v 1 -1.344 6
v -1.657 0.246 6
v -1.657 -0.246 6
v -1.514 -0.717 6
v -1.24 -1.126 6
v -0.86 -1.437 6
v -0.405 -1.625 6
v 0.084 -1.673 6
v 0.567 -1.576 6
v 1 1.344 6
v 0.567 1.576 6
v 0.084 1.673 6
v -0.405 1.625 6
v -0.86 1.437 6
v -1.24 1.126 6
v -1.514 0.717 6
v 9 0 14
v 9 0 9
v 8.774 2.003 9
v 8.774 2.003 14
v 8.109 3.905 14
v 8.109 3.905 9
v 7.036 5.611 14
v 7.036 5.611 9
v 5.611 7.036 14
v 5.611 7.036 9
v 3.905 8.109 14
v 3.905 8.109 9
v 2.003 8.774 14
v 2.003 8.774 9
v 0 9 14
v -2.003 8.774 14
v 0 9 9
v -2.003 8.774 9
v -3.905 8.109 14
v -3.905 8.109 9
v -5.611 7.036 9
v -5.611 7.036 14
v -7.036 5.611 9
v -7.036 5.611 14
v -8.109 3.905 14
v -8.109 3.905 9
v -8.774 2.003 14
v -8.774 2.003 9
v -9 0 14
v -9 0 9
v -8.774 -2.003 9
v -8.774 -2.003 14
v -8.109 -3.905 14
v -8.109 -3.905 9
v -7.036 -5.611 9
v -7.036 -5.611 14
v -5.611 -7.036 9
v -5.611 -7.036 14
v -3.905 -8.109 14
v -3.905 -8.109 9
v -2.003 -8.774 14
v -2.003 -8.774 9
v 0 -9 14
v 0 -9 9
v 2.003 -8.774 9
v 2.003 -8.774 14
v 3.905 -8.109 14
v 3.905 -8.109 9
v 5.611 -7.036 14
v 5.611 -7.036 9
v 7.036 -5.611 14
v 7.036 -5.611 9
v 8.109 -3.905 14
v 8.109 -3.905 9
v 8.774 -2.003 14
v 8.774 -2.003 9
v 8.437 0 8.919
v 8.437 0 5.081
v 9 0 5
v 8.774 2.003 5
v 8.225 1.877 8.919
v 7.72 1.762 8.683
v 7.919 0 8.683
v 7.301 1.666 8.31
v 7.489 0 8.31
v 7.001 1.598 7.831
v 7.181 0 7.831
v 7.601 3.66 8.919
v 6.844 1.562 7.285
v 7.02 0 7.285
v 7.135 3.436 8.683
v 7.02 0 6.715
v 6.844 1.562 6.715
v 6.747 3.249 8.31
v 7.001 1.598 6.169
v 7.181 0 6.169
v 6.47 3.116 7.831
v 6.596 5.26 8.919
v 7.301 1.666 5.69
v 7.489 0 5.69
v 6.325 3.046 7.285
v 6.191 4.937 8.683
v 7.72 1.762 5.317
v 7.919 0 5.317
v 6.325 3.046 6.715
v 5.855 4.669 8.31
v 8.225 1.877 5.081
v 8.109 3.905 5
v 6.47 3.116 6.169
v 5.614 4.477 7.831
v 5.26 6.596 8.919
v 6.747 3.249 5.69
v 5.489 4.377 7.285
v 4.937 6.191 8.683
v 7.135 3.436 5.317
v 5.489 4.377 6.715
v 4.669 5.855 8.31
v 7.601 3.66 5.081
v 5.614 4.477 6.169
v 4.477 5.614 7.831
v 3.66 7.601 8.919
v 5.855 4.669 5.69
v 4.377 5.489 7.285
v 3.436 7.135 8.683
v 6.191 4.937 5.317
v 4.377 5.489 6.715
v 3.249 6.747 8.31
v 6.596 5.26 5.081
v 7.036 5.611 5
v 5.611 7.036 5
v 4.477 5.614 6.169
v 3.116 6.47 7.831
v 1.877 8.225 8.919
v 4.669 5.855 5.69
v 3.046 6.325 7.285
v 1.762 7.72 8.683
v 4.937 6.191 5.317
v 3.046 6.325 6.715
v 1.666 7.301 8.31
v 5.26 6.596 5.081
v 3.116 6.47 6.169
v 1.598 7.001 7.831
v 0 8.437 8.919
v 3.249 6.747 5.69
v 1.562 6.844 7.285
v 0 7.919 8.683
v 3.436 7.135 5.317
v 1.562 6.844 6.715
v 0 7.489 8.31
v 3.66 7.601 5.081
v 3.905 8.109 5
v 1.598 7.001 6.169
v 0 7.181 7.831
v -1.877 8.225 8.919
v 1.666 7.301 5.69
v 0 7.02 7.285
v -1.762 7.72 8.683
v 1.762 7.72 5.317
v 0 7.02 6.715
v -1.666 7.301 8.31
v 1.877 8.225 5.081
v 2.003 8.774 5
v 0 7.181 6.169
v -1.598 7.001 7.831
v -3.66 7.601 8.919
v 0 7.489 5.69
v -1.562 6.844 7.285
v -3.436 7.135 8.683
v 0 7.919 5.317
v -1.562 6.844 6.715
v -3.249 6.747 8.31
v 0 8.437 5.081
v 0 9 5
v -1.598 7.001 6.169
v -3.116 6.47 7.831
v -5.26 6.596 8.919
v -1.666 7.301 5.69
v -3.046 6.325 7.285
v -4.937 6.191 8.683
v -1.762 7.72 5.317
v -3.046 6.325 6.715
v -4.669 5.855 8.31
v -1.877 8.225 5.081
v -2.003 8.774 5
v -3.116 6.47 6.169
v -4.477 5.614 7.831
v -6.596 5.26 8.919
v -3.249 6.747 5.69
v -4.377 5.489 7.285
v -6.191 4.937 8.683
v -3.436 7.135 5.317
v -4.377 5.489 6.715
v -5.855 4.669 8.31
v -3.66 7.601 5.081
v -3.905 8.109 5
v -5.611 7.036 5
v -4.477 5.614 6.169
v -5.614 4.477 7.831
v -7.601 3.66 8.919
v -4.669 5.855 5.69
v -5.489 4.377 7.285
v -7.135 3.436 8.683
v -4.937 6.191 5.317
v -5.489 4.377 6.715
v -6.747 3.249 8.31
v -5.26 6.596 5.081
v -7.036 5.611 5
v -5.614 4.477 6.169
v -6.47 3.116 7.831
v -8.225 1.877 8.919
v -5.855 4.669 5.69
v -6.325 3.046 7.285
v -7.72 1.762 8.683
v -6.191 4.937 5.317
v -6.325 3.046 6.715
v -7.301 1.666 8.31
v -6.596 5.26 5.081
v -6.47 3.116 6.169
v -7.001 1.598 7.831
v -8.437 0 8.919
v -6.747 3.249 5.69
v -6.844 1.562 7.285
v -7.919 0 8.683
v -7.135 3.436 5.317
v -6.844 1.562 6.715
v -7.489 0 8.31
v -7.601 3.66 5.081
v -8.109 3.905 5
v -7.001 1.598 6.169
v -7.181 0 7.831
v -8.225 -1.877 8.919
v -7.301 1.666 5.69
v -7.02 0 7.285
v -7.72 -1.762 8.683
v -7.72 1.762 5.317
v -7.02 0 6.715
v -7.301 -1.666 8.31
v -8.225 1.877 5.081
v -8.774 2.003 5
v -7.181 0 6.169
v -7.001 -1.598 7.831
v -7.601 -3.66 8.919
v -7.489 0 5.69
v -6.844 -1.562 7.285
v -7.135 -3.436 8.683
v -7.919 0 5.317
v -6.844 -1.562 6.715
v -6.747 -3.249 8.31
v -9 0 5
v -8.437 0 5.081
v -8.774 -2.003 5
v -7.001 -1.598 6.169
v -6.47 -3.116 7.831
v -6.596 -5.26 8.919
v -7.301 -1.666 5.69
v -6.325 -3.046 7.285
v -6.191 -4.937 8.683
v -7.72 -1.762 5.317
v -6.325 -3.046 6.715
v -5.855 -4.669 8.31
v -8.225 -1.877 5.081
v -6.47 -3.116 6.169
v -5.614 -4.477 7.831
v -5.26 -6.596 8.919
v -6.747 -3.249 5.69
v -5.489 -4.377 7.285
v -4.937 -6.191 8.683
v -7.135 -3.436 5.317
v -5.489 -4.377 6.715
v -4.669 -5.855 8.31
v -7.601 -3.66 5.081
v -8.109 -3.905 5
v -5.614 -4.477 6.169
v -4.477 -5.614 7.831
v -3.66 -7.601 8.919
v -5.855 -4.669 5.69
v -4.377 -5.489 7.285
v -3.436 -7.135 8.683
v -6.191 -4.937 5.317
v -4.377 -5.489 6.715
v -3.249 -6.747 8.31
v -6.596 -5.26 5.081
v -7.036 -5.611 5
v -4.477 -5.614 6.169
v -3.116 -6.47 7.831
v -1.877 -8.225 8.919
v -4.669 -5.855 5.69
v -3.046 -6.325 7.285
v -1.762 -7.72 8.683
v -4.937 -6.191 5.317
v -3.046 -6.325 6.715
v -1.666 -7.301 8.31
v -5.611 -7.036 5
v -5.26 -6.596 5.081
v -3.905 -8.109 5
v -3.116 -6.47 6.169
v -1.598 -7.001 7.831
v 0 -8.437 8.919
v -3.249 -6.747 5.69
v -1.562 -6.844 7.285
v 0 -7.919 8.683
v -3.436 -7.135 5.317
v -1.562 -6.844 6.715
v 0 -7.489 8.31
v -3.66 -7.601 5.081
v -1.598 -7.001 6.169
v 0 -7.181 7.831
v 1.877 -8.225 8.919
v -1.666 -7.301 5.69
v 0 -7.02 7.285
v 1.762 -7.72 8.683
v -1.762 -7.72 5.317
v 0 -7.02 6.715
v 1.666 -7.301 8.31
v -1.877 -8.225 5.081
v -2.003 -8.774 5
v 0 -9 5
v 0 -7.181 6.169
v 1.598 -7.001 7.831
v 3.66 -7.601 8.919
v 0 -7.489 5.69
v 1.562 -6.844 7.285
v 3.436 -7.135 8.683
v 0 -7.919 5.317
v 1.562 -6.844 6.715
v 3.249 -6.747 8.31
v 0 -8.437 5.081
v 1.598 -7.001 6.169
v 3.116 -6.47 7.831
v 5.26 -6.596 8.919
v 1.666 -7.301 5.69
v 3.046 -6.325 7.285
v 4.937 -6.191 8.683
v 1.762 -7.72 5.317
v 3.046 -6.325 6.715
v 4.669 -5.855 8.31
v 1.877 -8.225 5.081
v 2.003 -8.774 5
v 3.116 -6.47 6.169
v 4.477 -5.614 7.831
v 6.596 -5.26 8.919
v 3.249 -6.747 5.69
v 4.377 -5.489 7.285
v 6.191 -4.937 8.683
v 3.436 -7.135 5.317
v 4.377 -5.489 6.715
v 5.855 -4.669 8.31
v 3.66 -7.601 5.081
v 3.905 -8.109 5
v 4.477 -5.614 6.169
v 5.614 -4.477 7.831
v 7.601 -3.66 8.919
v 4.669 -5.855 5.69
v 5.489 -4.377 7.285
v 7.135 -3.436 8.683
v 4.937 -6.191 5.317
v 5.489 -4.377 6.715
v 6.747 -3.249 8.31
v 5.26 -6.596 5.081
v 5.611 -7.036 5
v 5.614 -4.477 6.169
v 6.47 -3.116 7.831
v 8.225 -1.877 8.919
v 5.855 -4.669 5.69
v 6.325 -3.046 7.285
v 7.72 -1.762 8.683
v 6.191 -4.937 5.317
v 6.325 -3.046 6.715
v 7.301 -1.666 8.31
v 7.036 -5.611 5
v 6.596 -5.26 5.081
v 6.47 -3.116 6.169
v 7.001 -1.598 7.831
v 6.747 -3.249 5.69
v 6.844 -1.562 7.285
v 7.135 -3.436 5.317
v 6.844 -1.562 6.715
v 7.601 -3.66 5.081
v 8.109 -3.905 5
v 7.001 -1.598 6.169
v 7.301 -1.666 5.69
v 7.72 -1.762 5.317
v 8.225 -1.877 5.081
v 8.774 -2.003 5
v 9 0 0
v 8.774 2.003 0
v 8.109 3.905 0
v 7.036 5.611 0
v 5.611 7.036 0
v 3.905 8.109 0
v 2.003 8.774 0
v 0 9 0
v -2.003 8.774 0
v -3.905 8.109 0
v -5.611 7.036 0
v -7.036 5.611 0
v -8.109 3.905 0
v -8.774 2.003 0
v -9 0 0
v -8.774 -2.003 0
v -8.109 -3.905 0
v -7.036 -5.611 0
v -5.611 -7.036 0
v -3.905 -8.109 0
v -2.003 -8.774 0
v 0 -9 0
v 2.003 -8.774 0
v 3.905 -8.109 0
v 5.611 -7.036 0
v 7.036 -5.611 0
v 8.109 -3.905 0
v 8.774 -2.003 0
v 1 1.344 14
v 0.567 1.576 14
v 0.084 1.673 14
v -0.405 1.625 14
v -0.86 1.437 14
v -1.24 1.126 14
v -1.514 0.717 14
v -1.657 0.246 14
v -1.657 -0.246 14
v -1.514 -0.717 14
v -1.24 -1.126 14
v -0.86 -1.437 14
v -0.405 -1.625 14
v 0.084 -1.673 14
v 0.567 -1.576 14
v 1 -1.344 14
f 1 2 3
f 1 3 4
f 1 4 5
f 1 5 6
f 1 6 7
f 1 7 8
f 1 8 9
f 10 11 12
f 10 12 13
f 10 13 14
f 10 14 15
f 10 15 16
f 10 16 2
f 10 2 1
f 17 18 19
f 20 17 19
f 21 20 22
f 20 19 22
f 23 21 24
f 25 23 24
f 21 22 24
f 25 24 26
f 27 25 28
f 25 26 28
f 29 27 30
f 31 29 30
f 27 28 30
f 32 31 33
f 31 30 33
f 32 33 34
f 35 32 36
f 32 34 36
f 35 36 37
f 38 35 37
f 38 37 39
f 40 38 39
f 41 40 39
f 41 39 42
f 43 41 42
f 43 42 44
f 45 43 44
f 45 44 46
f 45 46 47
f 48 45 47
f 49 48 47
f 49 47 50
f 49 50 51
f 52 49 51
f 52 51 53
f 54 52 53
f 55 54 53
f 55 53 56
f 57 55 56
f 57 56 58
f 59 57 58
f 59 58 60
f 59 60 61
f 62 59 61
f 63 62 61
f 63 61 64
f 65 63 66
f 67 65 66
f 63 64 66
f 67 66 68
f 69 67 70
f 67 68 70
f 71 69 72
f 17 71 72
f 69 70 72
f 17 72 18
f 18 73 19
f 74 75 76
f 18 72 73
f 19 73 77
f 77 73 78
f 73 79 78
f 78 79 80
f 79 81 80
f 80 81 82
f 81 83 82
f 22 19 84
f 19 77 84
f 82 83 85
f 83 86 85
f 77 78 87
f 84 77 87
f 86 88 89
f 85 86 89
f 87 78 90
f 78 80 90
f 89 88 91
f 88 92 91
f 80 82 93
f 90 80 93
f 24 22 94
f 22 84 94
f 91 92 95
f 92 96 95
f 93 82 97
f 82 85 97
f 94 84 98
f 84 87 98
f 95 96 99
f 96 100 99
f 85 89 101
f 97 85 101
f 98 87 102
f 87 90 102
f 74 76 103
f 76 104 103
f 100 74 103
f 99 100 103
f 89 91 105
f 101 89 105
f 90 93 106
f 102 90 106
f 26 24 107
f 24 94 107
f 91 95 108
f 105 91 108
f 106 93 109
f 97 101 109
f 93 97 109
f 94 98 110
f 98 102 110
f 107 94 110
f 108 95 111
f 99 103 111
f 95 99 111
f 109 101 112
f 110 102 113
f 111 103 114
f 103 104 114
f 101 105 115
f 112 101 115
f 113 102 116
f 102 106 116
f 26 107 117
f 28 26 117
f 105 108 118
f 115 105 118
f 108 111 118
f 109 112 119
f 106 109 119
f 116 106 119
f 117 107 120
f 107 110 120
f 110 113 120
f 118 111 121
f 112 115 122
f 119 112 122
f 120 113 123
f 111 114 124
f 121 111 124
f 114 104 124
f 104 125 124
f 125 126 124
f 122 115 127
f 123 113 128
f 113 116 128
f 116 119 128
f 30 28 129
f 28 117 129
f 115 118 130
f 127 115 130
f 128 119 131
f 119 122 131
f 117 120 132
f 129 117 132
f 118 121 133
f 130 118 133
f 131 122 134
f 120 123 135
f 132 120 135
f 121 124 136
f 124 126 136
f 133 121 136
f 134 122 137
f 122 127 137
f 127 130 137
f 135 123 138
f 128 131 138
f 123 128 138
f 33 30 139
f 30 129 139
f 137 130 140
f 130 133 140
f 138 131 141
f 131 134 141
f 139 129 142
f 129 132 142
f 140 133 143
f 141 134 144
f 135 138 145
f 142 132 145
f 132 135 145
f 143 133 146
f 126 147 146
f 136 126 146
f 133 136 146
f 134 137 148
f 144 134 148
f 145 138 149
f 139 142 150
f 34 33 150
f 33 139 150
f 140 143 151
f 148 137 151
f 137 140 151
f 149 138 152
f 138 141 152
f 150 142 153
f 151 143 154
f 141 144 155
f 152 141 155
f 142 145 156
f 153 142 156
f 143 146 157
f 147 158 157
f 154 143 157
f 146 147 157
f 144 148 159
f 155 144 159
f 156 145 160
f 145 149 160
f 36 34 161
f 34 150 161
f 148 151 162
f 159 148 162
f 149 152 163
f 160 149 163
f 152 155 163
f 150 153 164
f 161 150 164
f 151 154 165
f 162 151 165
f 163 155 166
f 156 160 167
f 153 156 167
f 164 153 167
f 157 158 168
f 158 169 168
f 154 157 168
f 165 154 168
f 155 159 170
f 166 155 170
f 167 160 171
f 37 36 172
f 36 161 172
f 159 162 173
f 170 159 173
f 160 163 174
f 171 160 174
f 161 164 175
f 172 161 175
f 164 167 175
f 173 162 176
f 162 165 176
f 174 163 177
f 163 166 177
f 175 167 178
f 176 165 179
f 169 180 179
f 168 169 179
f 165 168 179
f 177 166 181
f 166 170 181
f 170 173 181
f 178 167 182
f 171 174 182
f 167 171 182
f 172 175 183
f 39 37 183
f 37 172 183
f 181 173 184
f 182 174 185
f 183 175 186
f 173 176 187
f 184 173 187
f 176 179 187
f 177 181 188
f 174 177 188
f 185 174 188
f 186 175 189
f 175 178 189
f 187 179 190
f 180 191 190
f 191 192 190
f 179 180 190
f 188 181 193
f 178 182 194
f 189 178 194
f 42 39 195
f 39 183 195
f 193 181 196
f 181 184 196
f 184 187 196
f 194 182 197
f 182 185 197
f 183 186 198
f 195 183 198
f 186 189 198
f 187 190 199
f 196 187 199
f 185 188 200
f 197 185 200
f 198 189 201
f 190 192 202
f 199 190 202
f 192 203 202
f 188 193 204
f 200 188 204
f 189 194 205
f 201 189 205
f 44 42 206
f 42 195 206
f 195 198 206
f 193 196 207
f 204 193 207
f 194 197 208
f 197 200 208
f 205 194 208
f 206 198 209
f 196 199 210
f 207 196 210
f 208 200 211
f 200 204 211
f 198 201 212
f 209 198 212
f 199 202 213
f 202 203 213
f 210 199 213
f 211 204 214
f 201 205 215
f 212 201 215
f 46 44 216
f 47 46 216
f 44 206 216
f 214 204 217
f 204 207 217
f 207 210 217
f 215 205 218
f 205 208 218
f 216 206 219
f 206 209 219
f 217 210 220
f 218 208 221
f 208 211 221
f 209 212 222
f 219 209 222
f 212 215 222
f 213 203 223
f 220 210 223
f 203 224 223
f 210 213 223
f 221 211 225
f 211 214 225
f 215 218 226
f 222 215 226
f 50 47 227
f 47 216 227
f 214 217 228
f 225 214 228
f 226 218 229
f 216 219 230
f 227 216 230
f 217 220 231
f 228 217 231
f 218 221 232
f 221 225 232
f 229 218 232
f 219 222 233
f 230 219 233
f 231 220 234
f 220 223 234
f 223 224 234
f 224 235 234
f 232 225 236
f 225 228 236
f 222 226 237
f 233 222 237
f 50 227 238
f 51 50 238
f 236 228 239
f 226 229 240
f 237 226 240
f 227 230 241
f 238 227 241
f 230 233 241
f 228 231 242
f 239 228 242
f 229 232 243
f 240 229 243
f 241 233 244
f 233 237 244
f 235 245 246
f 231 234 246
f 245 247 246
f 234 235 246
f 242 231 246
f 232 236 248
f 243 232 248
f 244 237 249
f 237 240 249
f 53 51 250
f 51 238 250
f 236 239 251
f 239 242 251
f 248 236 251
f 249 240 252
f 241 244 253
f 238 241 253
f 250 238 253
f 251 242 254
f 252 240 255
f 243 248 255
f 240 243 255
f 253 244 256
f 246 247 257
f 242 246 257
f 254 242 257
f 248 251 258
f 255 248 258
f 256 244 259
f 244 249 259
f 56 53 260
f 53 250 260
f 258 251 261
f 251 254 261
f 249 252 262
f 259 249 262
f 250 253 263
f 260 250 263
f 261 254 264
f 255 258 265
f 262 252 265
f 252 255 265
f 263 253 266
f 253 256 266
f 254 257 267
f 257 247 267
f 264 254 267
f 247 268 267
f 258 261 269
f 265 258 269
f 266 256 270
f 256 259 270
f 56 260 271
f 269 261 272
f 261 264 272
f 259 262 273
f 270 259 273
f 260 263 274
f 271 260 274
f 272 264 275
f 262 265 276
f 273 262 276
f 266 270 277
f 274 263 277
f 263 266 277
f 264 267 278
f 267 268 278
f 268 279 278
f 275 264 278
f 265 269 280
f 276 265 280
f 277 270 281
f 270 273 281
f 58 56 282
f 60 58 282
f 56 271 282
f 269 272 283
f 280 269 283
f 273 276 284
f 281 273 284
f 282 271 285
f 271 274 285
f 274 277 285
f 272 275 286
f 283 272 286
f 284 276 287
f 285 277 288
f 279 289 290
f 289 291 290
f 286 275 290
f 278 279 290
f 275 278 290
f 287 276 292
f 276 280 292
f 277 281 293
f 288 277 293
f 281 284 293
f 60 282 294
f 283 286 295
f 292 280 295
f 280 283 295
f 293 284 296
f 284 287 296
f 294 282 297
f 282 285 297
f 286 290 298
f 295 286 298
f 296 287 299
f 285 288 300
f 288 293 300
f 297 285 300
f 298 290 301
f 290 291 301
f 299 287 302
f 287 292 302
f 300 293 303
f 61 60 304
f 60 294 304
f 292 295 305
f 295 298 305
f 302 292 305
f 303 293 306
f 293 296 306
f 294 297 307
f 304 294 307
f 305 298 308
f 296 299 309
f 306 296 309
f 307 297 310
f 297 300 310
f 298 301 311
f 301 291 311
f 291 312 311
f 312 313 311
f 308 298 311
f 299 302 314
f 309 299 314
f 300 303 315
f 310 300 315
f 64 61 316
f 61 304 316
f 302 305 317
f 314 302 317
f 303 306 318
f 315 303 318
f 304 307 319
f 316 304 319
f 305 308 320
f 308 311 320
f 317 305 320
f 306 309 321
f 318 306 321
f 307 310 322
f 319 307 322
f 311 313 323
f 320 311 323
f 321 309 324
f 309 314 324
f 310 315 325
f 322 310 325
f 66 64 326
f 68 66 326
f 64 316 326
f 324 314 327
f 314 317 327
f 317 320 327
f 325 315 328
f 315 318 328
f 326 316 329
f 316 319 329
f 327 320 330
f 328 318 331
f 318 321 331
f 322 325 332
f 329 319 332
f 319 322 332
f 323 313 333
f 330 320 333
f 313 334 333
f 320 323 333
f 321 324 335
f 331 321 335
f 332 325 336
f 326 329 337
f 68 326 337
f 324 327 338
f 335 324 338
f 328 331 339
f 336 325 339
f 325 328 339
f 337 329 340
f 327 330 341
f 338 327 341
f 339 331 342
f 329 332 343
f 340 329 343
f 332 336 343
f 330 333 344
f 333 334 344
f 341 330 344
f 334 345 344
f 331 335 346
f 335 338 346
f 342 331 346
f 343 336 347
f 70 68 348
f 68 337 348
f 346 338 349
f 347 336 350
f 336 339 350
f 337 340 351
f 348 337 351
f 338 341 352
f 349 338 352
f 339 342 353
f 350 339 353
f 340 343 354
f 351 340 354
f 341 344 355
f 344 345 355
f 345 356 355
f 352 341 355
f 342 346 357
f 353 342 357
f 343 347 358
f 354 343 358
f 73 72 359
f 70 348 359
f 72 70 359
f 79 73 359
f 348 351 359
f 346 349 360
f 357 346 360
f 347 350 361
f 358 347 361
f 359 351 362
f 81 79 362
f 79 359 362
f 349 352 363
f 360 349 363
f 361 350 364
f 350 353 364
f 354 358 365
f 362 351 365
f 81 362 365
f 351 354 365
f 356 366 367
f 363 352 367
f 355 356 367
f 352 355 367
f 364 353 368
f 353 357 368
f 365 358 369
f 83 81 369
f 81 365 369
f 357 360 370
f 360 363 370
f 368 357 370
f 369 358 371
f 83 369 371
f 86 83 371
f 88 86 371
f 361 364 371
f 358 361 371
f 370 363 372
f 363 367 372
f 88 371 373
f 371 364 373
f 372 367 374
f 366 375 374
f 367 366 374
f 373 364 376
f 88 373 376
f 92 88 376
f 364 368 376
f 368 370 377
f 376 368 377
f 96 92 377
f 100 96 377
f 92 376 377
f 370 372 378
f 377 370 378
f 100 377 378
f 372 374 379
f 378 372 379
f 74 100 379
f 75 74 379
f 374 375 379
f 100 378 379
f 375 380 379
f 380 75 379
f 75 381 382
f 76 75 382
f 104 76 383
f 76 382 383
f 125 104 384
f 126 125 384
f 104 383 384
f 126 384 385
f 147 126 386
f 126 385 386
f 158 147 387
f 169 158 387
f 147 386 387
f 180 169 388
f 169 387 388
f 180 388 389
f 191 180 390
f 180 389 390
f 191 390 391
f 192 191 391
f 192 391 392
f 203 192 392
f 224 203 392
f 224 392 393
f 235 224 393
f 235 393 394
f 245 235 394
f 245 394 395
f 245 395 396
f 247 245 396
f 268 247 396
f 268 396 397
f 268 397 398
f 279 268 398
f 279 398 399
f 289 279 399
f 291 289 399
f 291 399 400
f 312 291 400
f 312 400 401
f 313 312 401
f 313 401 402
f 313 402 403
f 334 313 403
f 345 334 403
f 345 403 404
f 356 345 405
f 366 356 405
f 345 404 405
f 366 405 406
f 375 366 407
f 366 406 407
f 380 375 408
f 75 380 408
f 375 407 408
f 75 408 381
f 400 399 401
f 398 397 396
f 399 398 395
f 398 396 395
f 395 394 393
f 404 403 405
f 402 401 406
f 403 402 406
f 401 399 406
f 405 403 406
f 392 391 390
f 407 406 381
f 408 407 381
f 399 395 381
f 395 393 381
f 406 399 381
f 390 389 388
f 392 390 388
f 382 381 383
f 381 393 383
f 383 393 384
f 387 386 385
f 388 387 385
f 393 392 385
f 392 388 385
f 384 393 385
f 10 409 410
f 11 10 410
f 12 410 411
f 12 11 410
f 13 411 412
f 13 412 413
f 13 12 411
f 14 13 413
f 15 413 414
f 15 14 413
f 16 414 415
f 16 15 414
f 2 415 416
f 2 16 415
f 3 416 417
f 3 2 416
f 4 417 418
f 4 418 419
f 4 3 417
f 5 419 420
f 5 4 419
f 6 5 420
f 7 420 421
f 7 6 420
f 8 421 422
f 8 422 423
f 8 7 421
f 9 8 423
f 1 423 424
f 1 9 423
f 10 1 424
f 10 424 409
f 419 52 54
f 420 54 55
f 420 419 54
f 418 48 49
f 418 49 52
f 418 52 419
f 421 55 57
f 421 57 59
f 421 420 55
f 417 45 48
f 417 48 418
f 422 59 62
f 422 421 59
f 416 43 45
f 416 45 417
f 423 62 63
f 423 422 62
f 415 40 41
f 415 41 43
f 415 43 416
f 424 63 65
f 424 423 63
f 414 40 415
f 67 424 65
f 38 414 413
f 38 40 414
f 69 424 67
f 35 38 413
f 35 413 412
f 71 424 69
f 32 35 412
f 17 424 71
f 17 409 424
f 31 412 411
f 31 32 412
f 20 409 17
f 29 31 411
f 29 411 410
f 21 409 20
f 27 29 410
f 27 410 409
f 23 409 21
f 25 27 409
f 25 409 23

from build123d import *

# Parameters (mm, degrees)
BOX_W             = 5
BOX_H             = 6
BOX_DEPTH         = 8
CYLINDER001_R     = 1.675
CYLINDER001_DEPTH = 8
TORUS_R           = 2
CYLINDER_R        = 9
CYLINDER_DEPTH    = 14


with BuildPart() as d:
    # Box → Box (new body)
    with BuildSketch(Plane(origin=(1, -3, 15), x_dir=(1, 0, 0), z_dir=(0, 0, 1))):
        with Locations((2.5, 3)):
            Rectangle(BOX_W, BOX_H)
    extrude(amount=BOX_DEPTH)


with BuildPart() as eje_d:
    # Cylinder001 → Cylinder001 (new body)
    with BuildSketch(Plane.XY.offset(15)):
        Circle(CYLINDER001_R)
    extrude(amount=CYLINDER001_DEPTH)

    # Cut: cut D
    add(d.part, mode=Mode.SUBTRACT)


with BuildPart() as eje_d_1:
    # Cut placement: moved
    add(eje_d.part.moved(Location((0, 0, -9))))


with BuildPart() as anclaje:
    # Torus → Torus (revolve)
    with BuildSketch(Plane(origin=(0, 0, 7), x_dir=(1, 0, 0), z_dir=(0, -1, 0))):
        with Locations((9, 0)):
            Circle(TORUS_R)
    revolve(axis=Axis((0, 0, 7), (0, 0, 1)))


with BuildPart() as rueda_acabada:
    # Cylinder → Cylinder (new body)
    with BuildSketch(Plane.XY):
        Circle(CYLINDER_R)
    extrude(amount=CYLINDER_DEPTH)

    # Cut001: cut anclaje
    add(anclaje.part, mode=Mode.SUBTRACT)

    # Cut002: cut EJE + D
    add(eje_d_1.part, mode=Mode.SUBTRACT)


solid = rueda_acabada.part
